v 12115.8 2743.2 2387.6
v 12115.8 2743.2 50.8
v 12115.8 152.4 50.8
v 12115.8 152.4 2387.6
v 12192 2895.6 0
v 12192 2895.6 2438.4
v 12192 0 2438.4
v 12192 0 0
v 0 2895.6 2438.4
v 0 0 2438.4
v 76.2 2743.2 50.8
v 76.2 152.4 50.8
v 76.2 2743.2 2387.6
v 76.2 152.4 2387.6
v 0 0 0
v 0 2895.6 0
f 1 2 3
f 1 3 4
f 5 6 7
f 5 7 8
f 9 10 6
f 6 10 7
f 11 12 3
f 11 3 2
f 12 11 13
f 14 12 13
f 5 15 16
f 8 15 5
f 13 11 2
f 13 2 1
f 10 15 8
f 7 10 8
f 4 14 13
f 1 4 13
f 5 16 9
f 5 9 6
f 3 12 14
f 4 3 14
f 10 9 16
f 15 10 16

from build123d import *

# Parameters (mm, degrees)
SKETCH1_W           = 12192
SKETCH1_H           = 2438.4
BOSS_EXTRUDE1_DEPTH = 2895.6
SKETCH2_W           = 2336.8
SKETCH2_H           = 2590.8
CUT_EXTRUDE1_DEPTH  = 12039.6


with BuildPart() as part:
    # Sketch1 → Boss-Extrude1 (new body)
    with BuildSketch(Plane(origin=(0, 0, 0), x_dir=(1, 0, 0), z_dir=(0, 1, 0))):
        with Locations((6096, -1219.2)):
            Rectangle(SKETCH1_W, SKETCH1_H)
    extrude(amount=BOSS_EXTRUDE1_DEPTH)

    # Sketch2 → Cut-Extrude1 (cut)
    with BuildSketch(Plane.ZY.offset(-76.2)):
        with Locations((1219.2, 1447.8)):
            Rectangle(SKETCH2_W, SKETCH2_H)
    extrude(amount=-CUT_EXTRUDE1_DEPTH, mode=Mode.SUBTRACT)


solid = part.part
